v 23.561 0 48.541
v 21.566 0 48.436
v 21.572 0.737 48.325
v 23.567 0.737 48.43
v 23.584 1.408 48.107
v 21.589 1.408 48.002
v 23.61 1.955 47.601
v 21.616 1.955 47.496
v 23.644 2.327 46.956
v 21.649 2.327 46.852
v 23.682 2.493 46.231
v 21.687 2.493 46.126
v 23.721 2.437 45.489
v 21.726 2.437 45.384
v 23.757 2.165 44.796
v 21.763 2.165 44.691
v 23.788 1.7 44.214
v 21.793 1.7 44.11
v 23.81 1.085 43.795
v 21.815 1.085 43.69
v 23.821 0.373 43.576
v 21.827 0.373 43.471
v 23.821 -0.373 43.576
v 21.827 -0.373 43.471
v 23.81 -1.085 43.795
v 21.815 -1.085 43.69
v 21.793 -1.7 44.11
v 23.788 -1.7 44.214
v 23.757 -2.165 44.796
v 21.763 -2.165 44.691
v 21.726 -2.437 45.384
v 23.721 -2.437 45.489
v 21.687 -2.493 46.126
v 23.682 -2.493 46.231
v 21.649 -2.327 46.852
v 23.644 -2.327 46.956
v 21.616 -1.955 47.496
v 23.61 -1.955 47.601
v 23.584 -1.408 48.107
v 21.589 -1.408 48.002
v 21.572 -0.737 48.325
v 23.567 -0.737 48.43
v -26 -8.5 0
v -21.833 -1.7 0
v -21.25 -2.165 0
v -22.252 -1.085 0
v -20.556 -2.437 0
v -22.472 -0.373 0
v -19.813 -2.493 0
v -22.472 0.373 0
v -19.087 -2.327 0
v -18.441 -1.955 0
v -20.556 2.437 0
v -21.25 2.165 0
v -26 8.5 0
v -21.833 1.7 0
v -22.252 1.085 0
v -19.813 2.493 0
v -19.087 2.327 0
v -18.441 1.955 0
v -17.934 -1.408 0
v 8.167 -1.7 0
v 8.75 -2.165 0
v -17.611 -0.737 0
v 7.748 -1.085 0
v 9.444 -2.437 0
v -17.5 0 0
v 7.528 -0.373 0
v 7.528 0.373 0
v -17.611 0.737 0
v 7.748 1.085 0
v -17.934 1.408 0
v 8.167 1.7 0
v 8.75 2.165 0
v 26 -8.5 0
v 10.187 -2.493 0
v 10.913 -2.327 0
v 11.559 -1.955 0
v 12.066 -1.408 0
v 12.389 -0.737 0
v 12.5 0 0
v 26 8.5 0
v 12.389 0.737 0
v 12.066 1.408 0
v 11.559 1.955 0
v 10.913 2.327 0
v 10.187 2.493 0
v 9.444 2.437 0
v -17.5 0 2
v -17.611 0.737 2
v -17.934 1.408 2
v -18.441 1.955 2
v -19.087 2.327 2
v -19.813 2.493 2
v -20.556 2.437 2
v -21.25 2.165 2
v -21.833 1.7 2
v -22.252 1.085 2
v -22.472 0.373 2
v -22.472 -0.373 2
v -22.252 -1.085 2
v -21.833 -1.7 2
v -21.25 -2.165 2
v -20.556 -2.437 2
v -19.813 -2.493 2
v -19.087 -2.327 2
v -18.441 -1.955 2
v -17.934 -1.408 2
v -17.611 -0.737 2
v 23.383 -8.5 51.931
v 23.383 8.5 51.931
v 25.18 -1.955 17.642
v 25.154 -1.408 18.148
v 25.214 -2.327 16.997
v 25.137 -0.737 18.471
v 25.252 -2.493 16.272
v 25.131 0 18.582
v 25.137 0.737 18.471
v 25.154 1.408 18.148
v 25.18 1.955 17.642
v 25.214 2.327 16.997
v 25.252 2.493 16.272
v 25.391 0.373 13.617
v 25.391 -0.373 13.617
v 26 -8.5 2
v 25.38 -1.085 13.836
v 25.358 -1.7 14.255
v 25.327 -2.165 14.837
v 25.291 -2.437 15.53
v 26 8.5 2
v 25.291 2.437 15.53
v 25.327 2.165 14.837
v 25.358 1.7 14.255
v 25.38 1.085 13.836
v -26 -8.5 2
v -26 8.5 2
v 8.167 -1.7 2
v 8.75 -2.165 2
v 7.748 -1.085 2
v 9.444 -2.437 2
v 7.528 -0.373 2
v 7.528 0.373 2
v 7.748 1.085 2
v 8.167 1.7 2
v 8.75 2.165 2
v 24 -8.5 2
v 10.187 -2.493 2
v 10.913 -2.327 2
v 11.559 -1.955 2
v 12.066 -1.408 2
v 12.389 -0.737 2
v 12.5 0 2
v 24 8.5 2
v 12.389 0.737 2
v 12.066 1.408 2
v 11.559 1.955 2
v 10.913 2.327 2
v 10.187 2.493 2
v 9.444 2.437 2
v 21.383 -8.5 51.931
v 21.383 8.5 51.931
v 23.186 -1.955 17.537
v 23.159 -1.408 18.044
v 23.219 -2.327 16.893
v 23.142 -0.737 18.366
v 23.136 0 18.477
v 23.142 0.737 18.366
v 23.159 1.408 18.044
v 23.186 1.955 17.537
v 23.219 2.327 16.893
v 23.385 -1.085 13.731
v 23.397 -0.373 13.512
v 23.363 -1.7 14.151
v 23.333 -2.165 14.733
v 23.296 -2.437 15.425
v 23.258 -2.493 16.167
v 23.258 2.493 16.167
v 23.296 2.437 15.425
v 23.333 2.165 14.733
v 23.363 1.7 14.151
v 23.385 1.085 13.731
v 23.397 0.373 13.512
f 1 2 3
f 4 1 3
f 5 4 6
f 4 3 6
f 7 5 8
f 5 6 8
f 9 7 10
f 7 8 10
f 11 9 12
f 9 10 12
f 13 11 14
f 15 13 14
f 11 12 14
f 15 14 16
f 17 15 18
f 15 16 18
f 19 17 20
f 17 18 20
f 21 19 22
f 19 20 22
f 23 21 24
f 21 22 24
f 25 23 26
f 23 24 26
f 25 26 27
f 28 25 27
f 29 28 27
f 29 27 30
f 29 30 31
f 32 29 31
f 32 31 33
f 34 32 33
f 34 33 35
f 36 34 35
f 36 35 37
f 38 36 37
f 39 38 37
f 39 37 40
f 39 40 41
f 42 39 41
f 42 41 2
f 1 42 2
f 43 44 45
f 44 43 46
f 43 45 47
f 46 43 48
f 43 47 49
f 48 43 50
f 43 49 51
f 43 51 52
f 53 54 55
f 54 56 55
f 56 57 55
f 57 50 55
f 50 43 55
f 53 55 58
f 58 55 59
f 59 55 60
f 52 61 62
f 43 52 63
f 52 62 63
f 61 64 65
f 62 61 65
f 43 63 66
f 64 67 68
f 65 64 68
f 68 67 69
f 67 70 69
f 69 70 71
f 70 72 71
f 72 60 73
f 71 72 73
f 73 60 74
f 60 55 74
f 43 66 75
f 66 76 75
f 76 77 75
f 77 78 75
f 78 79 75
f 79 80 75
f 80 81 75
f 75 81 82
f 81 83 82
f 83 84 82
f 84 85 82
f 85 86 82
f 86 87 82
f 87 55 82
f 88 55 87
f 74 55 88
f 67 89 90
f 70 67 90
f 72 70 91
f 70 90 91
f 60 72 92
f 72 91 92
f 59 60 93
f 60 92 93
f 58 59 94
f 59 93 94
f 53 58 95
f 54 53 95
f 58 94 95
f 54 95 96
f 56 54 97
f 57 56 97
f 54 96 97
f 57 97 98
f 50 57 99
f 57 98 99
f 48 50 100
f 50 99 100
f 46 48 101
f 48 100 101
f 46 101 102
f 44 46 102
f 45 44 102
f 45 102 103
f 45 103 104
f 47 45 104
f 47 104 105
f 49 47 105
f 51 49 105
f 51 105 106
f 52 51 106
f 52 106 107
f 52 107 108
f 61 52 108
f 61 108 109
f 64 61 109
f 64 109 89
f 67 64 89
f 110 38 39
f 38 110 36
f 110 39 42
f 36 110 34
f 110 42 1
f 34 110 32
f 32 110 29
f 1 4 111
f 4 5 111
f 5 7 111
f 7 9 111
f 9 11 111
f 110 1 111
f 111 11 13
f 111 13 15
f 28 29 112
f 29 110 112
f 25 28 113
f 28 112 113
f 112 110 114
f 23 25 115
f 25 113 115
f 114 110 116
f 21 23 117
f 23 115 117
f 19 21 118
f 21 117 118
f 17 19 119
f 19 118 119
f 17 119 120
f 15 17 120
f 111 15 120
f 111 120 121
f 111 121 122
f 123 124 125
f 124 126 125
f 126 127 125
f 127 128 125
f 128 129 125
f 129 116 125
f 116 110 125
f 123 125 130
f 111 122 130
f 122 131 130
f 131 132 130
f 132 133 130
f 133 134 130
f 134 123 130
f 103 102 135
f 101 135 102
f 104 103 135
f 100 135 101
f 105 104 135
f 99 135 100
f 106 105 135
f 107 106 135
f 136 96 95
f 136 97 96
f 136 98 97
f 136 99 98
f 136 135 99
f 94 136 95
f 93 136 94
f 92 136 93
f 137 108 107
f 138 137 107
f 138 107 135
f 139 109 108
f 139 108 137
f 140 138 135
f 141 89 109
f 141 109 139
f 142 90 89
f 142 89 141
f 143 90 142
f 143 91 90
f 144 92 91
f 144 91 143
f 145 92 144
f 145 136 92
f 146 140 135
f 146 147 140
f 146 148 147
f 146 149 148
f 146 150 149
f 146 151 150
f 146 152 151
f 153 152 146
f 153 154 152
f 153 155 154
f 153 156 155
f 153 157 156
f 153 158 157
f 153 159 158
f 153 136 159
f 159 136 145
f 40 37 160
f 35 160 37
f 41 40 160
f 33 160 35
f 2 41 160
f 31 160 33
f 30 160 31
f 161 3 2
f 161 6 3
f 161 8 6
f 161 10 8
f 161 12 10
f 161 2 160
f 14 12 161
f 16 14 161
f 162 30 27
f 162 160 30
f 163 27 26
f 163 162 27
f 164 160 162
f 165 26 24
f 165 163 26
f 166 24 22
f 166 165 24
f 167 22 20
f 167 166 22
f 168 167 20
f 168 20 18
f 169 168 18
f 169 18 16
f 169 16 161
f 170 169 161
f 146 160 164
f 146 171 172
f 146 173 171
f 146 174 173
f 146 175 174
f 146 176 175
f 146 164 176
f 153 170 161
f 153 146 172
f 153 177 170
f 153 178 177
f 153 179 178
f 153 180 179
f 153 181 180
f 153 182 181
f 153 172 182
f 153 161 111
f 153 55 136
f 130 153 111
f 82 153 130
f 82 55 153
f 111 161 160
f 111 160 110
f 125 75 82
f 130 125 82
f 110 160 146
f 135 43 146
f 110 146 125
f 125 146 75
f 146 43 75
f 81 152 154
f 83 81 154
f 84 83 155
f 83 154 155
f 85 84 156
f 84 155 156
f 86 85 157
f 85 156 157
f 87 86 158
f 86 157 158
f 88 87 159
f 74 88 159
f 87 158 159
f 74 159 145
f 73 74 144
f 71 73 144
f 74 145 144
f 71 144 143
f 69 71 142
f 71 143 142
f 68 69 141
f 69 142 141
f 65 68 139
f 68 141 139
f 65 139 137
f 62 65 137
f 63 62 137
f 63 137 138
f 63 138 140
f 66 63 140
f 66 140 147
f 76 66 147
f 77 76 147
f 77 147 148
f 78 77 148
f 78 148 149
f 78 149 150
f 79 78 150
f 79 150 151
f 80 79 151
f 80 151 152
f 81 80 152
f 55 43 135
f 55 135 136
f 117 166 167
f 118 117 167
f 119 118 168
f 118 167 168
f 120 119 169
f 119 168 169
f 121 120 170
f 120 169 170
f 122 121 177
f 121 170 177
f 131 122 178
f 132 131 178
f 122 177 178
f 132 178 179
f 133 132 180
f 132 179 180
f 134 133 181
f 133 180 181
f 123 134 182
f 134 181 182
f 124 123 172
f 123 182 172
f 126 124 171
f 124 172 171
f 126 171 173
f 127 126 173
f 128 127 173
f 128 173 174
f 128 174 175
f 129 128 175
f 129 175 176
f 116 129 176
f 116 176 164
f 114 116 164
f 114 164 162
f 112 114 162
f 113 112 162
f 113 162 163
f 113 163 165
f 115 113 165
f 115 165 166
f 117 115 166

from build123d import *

# Parameters (mm, degrees)
ESQUISSE1_W             = 52
ESQUISSE1_H             = 17
BOSS_EXTRU_1_DEPTH      = 2
ESQUISSE2_W             = 2
ESQUISSE2_H             = 17
BOSS_EXTRU_2_DEPTH      = 50
ESQUISSE3_R             = 2.5
ENL_V_MAT_EXTRU_1_DEPTH = 50
ESQUISSE4_R             = 2.5
ENL_V_MAT_EXTRU_2_DEPTH = 50


with BuildPart() as part:
    # Esquisse1 → Boss.-Extru.1 (new body)
    with BuildSketch(Plane.XY):
        Rectangle(ESQUISSE1_W, ESQUISSE1_H)
    extrude(amount=BOSS_EXTRU_1_DEPTH)

    # Esquisse2 → Boss.-Extru.2 (add, along a direction that is not the sketch's normal)
    with BuildSketch(Plane.XY.offset(2)):
        with Locations((25, 0)):
            Rectangle(ESQUISSE2_W, ESQUISSE2_H)
    extrude(amount=BOSS_EXTRU_2_DEPTH, dir=(-0.052335956242937125, 0, 0.9986295347545743))

    # Esquisse3 → Enlèv. mat.-Extru.1 (cut)
    with BuildSketch(Plane.XY.offset(2)):
        with Locations((-20, 0)):
            Circle(ESQUISSE3_R)
        with Locations((10, 0)):
            Circle(ESQUISSE3_R)
    extrude(amount=-ENL_V_MAT_EXTRU_1_DEPTH, mode=Mode.SUBTRACT)

    # Esquisse4 → Enlèv. mat.-Extru.2 (cut)
    with BuildSketch(Plane(origin=(24.038791208, 0, 1.259819664), x_dir=(-0.052335956242937125, 0, 0.9986295347545743), z_dir=(-0.9986295347545743, 0, -0.052335956242937125))):
        with Locations((44.74119612, 0)):
            Circle(ESQUISSE4_R)
        with Locations((14.74119612, 0)):
            Circle(ESQUISSE4_R)
    extrude(amount=-ENL_V_MAT_EXTRU_2_DEPTH, mode=Mode.SUBTRACT)


solid = part.part
